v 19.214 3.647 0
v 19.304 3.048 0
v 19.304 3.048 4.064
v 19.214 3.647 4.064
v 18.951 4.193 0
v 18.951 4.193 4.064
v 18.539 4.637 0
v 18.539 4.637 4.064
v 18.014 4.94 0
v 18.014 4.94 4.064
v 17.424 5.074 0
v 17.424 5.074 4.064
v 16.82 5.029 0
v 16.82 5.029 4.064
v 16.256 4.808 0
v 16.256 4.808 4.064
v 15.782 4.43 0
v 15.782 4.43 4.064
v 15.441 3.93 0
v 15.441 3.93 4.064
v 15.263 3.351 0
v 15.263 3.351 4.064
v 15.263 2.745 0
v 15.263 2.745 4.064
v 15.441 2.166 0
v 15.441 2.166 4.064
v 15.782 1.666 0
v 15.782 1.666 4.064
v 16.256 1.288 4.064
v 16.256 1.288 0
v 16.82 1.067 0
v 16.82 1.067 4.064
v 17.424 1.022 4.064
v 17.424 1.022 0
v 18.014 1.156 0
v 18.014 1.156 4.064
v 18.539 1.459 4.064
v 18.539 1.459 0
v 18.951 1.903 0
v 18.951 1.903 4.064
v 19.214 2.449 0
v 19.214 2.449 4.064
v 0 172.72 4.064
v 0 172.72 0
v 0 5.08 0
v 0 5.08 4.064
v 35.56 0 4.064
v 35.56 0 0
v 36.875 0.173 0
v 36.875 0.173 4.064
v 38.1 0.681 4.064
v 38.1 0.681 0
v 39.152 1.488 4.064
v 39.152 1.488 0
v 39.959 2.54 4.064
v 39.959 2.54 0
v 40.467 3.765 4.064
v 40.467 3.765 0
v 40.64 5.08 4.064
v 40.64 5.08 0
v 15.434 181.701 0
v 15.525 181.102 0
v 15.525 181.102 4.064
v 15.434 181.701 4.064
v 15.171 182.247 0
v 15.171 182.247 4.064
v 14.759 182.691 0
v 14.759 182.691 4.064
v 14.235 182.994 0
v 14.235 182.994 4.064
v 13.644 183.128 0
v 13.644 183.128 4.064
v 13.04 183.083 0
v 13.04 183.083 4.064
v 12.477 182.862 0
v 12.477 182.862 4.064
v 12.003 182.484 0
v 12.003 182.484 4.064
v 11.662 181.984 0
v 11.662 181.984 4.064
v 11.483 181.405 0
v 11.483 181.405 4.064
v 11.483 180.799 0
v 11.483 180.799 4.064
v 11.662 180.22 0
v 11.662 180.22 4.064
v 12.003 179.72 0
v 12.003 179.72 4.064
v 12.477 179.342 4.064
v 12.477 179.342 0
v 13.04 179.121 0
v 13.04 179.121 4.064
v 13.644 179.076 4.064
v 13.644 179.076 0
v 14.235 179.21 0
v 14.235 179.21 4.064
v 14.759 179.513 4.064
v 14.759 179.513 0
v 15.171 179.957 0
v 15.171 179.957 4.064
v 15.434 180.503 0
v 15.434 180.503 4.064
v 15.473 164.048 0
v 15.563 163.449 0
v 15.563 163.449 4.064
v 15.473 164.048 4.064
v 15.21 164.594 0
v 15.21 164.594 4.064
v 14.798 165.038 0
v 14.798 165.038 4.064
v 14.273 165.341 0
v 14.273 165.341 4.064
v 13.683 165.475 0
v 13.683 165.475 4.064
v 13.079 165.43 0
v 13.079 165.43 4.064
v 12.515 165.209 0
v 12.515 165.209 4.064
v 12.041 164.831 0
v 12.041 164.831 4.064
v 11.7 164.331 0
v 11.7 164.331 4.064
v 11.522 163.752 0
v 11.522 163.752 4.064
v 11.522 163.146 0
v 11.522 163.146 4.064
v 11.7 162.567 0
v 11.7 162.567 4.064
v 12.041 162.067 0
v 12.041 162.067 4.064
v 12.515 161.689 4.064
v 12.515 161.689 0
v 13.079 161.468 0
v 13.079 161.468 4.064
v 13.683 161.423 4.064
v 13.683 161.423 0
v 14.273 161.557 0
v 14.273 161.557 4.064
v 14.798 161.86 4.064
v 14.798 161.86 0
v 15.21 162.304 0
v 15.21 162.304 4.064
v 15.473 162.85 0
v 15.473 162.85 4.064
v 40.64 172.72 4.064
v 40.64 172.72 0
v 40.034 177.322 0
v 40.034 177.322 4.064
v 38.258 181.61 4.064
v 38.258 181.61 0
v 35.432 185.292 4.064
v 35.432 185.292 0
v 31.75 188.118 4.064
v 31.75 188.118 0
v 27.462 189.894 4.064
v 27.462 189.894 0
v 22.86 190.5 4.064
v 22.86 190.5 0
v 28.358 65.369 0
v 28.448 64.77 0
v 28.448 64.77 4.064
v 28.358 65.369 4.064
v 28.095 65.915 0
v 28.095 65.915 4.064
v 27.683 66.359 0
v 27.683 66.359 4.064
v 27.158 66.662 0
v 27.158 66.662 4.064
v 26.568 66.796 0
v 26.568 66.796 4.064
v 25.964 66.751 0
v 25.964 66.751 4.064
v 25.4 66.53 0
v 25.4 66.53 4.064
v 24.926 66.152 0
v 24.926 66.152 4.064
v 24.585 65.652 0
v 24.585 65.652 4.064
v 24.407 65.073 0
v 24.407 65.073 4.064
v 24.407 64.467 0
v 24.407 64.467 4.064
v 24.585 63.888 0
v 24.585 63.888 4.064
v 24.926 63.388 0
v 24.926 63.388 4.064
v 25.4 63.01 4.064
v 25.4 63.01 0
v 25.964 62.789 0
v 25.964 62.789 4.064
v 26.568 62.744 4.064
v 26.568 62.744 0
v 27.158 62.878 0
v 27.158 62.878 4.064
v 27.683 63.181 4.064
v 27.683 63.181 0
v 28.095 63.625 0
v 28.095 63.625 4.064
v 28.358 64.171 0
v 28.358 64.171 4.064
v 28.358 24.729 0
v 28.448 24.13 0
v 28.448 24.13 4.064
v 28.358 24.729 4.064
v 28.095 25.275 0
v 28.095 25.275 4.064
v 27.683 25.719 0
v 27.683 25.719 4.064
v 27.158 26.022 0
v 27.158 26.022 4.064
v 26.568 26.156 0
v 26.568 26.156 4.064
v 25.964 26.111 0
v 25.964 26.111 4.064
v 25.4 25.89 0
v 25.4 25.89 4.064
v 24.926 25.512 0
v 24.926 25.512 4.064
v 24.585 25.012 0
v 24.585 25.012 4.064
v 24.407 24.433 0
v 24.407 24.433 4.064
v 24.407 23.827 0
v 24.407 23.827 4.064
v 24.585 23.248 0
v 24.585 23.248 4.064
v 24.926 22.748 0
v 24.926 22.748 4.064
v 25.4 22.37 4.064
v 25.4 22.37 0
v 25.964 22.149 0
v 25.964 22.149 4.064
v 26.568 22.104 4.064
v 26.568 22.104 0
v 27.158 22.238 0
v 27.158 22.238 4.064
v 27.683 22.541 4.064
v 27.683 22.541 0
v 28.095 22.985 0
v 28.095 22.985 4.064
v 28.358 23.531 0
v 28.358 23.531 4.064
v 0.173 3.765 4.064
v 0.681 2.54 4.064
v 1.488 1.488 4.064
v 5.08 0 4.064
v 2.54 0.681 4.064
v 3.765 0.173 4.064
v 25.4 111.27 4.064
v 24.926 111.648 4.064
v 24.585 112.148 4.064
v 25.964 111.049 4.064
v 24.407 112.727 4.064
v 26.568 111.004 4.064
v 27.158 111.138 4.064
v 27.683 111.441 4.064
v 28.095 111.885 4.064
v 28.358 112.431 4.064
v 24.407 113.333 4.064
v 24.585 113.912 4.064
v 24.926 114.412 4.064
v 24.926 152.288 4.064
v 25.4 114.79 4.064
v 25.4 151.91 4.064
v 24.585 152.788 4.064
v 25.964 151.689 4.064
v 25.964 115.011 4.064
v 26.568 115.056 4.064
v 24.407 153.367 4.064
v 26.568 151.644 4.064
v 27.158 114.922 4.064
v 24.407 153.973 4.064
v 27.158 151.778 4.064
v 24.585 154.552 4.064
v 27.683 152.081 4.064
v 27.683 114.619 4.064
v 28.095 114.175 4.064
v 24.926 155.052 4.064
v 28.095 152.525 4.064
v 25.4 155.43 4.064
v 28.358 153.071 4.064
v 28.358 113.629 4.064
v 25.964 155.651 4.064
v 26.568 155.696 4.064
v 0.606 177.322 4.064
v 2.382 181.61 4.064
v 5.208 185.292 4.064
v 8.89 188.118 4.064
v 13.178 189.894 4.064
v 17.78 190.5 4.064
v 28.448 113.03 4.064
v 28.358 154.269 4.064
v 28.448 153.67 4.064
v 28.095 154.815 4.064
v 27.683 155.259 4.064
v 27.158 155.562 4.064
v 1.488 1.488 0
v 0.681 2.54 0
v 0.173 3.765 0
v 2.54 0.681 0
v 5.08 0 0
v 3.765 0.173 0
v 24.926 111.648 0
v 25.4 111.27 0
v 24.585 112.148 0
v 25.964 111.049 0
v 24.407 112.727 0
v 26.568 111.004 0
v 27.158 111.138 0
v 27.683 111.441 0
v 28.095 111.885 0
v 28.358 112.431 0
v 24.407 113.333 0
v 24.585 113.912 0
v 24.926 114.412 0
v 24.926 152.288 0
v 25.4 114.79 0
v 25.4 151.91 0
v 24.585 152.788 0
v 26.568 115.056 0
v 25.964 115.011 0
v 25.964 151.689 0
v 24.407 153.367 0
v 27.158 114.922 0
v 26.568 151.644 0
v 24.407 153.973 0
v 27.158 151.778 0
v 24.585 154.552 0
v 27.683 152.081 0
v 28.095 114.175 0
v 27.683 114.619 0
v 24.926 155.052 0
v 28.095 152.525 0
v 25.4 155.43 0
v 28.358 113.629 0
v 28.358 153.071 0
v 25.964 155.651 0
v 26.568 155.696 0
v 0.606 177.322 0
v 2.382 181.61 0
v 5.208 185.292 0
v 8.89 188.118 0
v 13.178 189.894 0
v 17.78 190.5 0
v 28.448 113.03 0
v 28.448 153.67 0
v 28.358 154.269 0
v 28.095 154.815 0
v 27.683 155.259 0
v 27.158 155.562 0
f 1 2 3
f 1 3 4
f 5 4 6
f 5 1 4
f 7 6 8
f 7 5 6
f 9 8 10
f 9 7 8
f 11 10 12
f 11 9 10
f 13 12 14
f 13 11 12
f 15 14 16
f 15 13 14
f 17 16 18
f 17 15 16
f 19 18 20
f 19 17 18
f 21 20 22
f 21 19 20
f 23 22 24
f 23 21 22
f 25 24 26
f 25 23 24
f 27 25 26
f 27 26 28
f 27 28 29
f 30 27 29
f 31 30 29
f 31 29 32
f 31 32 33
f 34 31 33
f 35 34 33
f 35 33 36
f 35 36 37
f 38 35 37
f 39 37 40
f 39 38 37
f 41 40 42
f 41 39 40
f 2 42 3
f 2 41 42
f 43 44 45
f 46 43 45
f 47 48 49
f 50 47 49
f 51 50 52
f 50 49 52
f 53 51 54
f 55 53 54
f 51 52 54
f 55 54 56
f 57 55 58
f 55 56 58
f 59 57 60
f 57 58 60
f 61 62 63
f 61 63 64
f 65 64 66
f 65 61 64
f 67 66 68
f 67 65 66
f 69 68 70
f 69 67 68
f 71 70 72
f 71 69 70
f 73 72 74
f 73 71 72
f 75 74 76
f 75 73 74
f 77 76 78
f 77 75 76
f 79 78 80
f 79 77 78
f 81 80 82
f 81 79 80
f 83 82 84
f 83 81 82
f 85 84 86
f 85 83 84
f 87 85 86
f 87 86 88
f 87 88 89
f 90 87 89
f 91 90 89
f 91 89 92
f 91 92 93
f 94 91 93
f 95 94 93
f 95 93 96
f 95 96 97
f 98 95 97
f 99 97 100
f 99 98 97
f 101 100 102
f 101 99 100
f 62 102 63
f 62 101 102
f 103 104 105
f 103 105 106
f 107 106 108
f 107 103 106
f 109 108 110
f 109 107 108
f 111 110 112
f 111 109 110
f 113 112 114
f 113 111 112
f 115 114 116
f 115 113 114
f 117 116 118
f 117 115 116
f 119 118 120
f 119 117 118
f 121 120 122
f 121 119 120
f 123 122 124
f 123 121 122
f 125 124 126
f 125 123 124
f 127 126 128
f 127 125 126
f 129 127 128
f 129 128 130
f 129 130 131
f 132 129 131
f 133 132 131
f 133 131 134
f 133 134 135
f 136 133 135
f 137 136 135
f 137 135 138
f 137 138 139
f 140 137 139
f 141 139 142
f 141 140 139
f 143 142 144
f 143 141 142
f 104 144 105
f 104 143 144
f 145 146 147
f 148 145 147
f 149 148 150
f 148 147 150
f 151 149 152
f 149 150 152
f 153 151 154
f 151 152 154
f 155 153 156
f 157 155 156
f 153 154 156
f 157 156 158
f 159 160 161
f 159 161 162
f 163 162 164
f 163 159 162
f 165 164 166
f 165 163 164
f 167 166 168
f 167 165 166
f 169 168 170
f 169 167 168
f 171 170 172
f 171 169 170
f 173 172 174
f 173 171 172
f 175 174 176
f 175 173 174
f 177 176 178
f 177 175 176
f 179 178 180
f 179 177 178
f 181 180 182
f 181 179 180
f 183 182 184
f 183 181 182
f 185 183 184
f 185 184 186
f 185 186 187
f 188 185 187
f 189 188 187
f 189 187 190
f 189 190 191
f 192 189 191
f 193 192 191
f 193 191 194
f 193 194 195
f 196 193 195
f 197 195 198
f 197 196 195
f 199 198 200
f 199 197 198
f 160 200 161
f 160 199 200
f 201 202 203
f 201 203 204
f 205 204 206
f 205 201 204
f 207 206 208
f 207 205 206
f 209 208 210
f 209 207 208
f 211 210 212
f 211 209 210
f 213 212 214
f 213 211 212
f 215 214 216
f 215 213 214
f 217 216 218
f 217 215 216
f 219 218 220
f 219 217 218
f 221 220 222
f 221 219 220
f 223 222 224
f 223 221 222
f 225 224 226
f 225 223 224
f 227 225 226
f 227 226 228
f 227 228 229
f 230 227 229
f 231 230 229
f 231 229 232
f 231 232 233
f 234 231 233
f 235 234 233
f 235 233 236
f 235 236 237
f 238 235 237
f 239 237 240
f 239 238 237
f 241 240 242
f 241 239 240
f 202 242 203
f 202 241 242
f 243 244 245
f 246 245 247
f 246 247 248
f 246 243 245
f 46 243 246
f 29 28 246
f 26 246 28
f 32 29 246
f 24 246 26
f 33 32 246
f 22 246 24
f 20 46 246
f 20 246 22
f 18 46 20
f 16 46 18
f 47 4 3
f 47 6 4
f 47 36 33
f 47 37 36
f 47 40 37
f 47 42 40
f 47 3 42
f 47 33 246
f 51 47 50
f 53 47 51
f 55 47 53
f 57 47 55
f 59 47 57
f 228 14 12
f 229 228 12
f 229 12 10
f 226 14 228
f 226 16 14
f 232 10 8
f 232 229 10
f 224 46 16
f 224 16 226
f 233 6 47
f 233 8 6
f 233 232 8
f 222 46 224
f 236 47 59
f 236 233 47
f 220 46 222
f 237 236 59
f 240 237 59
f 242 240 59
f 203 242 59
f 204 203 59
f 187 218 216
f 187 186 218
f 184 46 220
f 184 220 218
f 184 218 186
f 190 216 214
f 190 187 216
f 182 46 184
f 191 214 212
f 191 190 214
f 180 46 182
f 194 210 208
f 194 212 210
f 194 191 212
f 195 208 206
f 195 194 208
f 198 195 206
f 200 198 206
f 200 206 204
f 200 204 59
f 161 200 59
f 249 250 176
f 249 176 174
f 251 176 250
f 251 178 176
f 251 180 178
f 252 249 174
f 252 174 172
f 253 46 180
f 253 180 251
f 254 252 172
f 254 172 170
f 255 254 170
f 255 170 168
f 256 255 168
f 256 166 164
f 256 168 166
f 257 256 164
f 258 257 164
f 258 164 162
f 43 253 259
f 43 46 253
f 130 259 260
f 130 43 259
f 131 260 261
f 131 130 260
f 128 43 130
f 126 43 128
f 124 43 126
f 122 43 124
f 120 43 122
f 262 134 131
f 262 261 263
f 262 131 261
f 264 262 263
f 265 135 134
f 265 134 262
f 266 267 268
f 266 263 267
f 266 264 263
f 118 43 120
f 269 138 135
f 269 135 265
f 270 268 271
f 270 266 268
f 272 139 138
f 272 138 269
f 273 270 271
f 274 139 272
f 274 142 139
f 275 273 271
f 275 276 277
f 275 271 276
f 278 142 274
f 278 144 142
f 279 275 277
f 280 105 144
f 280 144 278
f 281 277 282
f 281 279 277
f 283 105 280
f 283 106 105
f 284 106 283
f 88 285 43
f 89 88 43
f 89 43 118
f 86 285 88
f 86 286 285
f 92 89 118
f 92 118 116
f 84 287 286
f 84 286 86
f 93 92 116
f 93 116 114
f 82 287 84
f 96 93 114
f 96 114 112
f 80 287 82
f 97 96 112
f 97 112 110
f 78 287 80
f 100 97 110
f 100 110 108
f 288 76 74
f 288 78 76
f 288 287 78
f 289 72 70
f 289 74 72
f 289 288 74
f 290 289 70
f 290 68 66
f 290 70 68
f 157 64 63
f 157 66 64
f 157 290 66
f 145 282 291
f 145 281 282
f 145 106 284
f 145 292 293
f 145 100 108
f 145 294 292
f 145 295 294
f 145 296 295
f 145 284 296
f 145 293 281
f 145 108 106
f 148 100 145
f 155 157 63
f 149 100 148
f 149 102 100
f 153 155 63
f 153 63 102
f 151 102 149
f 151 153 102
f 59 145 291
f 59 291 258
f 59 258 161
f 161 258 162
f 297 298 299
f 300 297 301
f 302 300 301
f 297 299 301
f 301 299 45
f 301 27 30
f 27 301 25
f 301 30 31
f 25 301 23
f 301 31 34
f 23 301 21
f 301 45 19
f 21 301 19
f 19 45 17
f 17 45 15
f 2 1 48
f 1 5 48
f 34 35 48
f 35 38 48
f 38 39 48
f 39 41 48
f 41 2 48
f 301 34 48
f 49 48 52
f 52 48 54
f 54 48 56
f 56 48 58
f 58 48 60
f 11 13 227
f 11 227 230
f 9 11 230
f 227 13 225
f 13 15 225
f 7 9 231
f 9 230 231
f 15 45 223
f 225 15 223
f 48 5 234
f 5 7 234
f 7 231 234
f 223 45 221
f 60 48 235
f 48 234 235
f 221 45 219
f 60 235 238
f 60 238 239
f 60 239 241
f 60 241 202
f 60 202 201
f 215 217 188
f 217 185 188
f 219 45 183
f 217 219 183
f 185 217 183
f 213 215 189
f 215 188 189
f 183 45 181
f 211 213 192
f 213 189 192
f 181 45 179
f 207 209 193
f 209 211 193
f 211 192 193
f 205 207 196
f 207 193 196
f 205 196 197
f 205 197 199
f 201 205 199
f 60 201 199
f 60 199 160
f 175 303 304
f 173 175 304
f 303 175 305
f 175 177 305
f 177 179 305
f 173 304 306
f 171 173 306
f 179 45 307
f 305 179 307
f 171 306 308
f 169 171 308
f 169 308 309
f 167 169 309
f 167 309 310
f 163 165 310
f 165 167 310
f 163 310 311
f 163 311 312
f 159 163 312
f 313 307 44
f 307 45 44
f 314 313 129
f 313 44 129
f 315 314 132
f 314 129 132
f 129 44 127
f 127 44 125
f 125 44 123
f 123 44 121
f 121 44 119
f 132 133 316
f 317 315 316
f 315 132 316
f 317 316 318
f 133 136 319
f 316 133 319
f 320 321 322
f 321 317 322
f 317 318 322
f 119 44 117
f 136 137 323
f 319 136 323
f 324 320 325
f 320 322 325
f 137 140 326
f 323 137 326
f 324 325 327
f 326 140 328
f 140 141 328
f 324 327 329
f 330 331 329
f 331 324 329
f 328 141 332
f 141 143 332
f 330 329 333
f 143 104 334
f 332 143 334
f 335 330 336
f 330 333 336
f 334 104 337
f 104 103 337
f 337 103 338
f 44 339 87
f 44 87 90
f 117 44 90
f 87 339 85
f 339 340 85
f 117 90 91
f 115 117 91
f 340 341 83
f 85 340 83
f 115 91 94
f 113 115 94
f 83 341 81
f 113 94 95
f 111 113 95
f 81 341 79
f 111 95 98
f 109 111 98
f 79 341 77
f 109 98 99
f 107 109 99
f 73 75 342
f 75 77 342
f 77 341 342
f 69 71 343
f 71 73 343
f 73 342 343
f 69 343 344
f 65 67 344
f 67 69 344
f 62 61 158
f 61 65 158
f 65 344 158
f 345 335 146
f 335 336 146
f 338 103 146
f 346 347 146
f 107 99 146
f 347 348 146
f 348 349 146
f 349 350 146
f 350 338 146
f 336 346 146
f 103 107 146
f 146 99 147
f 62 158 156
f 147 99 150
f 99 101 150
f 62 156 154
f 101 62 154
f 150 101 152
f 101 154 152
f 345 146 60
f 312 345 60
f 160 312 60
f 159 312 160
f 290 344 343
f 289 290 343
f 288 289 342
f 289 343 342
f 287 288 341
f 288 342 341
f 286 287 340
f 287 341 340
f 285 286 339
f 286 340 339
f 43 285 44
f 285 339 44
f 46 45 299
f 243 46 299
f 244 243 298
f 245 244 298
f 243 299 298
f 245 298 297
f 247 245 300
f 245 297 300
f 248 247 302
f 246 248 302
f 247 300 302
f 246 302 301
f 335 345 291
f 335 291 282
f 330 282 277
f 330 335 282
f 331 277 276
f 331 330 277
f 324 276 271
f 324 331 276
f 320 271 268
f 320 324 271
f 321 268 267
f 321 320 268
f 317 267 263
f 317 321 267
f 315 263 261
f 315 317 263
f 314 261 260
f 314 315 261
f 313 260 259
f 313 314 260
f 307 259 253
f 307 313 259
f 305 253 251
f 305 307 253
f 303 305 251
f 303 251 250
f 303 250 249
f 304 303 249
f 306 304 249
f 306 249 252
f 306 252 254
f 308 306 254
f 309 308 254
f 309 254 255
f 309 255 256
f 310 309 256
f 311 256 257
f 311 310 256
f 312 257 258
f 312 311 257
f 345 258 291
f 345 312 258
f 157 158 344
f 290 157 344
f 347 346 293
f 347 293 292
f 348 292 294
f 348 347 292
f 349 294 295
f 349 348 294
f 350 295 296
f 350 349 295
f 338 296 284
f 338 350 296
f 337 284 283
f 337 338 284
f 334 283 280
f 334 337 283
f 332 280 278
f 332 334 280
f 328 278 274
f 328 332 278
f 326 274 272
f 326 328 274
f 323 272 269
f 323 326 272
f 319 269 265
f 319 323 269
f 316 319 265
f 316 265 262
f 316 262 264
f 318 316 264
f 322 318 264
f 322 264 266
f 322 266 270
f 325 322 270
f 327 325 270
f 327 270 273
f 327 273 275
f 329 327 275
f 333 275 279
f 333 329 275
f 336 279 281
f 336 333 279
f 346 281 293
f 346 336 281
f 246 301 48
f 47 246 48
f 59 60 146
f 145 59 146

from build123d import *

# Parameters (mm, degrees)
SKETCH1_R           = 2.032
BOSS_EXTRUDE2_DEPTH = 4.064


with BuildPart() as part:
    # Sketch1 → Boss-Extrude2 (new body)
    with BuildSketch(Plane.XY):
        with BuildLine():
            Line((40.64, 5.08), (40.64, 172.72))
            ThreePointArc((40.64, 172.72), (35.432358569, 185.292358569), (22.86, 190.5))
            Line((22.86, 190.5), (17.78, 190.5))
            ThreePointArc((17.78, 190.5), (5.207641431, 185.292358569), (0, 172.72))
            Line((0, 172.72), (0, 5.08))
            ThreePointArc((0, 5.08), (1.487897552, 1.487897552), (5.08, 0))
            Line((5.08, 0), (26.416, 0))
            Line((26.416, 0), (35.56, 0))
            ThreePointArc((35.56, 0), (39.152102448, 1.487897552), (40.64, 5.08))
        make_face()
        with Locations((26.416, 24.13)):
            Circle(SKETCH1_R, mode=Mode.SUBTRACT)
        with Locations((26.416, 64.77)):
            Circle(SKETCH1_R, mode=Mode.SUBTRACT)
        with Locations((26.416, 113.03)):
            Circle(SKETCH1_R, mode=Mode.SUBTRACT)
        with Locations((26.416, 153.67)):
            Circle(SKETCH1_R, mode=Mode.SUBTRACT)
        with Locations((17.272, 3.048)):
            Circle(SKETCH1_R, mode=Mode.SUBTRACT)
        with Locations((13.531045562, 163.449)):
            Circle(SKETCH1_R, mode=Mode.SUBTRACT)
        with Locations((13.492529792, 181.102)):
            Circle(SKETCH1_R, mode=Mode.SUBTRACT)
    extrude(amount=BOSS_EXTRUDE2_DEPTH)


solid = part.part
